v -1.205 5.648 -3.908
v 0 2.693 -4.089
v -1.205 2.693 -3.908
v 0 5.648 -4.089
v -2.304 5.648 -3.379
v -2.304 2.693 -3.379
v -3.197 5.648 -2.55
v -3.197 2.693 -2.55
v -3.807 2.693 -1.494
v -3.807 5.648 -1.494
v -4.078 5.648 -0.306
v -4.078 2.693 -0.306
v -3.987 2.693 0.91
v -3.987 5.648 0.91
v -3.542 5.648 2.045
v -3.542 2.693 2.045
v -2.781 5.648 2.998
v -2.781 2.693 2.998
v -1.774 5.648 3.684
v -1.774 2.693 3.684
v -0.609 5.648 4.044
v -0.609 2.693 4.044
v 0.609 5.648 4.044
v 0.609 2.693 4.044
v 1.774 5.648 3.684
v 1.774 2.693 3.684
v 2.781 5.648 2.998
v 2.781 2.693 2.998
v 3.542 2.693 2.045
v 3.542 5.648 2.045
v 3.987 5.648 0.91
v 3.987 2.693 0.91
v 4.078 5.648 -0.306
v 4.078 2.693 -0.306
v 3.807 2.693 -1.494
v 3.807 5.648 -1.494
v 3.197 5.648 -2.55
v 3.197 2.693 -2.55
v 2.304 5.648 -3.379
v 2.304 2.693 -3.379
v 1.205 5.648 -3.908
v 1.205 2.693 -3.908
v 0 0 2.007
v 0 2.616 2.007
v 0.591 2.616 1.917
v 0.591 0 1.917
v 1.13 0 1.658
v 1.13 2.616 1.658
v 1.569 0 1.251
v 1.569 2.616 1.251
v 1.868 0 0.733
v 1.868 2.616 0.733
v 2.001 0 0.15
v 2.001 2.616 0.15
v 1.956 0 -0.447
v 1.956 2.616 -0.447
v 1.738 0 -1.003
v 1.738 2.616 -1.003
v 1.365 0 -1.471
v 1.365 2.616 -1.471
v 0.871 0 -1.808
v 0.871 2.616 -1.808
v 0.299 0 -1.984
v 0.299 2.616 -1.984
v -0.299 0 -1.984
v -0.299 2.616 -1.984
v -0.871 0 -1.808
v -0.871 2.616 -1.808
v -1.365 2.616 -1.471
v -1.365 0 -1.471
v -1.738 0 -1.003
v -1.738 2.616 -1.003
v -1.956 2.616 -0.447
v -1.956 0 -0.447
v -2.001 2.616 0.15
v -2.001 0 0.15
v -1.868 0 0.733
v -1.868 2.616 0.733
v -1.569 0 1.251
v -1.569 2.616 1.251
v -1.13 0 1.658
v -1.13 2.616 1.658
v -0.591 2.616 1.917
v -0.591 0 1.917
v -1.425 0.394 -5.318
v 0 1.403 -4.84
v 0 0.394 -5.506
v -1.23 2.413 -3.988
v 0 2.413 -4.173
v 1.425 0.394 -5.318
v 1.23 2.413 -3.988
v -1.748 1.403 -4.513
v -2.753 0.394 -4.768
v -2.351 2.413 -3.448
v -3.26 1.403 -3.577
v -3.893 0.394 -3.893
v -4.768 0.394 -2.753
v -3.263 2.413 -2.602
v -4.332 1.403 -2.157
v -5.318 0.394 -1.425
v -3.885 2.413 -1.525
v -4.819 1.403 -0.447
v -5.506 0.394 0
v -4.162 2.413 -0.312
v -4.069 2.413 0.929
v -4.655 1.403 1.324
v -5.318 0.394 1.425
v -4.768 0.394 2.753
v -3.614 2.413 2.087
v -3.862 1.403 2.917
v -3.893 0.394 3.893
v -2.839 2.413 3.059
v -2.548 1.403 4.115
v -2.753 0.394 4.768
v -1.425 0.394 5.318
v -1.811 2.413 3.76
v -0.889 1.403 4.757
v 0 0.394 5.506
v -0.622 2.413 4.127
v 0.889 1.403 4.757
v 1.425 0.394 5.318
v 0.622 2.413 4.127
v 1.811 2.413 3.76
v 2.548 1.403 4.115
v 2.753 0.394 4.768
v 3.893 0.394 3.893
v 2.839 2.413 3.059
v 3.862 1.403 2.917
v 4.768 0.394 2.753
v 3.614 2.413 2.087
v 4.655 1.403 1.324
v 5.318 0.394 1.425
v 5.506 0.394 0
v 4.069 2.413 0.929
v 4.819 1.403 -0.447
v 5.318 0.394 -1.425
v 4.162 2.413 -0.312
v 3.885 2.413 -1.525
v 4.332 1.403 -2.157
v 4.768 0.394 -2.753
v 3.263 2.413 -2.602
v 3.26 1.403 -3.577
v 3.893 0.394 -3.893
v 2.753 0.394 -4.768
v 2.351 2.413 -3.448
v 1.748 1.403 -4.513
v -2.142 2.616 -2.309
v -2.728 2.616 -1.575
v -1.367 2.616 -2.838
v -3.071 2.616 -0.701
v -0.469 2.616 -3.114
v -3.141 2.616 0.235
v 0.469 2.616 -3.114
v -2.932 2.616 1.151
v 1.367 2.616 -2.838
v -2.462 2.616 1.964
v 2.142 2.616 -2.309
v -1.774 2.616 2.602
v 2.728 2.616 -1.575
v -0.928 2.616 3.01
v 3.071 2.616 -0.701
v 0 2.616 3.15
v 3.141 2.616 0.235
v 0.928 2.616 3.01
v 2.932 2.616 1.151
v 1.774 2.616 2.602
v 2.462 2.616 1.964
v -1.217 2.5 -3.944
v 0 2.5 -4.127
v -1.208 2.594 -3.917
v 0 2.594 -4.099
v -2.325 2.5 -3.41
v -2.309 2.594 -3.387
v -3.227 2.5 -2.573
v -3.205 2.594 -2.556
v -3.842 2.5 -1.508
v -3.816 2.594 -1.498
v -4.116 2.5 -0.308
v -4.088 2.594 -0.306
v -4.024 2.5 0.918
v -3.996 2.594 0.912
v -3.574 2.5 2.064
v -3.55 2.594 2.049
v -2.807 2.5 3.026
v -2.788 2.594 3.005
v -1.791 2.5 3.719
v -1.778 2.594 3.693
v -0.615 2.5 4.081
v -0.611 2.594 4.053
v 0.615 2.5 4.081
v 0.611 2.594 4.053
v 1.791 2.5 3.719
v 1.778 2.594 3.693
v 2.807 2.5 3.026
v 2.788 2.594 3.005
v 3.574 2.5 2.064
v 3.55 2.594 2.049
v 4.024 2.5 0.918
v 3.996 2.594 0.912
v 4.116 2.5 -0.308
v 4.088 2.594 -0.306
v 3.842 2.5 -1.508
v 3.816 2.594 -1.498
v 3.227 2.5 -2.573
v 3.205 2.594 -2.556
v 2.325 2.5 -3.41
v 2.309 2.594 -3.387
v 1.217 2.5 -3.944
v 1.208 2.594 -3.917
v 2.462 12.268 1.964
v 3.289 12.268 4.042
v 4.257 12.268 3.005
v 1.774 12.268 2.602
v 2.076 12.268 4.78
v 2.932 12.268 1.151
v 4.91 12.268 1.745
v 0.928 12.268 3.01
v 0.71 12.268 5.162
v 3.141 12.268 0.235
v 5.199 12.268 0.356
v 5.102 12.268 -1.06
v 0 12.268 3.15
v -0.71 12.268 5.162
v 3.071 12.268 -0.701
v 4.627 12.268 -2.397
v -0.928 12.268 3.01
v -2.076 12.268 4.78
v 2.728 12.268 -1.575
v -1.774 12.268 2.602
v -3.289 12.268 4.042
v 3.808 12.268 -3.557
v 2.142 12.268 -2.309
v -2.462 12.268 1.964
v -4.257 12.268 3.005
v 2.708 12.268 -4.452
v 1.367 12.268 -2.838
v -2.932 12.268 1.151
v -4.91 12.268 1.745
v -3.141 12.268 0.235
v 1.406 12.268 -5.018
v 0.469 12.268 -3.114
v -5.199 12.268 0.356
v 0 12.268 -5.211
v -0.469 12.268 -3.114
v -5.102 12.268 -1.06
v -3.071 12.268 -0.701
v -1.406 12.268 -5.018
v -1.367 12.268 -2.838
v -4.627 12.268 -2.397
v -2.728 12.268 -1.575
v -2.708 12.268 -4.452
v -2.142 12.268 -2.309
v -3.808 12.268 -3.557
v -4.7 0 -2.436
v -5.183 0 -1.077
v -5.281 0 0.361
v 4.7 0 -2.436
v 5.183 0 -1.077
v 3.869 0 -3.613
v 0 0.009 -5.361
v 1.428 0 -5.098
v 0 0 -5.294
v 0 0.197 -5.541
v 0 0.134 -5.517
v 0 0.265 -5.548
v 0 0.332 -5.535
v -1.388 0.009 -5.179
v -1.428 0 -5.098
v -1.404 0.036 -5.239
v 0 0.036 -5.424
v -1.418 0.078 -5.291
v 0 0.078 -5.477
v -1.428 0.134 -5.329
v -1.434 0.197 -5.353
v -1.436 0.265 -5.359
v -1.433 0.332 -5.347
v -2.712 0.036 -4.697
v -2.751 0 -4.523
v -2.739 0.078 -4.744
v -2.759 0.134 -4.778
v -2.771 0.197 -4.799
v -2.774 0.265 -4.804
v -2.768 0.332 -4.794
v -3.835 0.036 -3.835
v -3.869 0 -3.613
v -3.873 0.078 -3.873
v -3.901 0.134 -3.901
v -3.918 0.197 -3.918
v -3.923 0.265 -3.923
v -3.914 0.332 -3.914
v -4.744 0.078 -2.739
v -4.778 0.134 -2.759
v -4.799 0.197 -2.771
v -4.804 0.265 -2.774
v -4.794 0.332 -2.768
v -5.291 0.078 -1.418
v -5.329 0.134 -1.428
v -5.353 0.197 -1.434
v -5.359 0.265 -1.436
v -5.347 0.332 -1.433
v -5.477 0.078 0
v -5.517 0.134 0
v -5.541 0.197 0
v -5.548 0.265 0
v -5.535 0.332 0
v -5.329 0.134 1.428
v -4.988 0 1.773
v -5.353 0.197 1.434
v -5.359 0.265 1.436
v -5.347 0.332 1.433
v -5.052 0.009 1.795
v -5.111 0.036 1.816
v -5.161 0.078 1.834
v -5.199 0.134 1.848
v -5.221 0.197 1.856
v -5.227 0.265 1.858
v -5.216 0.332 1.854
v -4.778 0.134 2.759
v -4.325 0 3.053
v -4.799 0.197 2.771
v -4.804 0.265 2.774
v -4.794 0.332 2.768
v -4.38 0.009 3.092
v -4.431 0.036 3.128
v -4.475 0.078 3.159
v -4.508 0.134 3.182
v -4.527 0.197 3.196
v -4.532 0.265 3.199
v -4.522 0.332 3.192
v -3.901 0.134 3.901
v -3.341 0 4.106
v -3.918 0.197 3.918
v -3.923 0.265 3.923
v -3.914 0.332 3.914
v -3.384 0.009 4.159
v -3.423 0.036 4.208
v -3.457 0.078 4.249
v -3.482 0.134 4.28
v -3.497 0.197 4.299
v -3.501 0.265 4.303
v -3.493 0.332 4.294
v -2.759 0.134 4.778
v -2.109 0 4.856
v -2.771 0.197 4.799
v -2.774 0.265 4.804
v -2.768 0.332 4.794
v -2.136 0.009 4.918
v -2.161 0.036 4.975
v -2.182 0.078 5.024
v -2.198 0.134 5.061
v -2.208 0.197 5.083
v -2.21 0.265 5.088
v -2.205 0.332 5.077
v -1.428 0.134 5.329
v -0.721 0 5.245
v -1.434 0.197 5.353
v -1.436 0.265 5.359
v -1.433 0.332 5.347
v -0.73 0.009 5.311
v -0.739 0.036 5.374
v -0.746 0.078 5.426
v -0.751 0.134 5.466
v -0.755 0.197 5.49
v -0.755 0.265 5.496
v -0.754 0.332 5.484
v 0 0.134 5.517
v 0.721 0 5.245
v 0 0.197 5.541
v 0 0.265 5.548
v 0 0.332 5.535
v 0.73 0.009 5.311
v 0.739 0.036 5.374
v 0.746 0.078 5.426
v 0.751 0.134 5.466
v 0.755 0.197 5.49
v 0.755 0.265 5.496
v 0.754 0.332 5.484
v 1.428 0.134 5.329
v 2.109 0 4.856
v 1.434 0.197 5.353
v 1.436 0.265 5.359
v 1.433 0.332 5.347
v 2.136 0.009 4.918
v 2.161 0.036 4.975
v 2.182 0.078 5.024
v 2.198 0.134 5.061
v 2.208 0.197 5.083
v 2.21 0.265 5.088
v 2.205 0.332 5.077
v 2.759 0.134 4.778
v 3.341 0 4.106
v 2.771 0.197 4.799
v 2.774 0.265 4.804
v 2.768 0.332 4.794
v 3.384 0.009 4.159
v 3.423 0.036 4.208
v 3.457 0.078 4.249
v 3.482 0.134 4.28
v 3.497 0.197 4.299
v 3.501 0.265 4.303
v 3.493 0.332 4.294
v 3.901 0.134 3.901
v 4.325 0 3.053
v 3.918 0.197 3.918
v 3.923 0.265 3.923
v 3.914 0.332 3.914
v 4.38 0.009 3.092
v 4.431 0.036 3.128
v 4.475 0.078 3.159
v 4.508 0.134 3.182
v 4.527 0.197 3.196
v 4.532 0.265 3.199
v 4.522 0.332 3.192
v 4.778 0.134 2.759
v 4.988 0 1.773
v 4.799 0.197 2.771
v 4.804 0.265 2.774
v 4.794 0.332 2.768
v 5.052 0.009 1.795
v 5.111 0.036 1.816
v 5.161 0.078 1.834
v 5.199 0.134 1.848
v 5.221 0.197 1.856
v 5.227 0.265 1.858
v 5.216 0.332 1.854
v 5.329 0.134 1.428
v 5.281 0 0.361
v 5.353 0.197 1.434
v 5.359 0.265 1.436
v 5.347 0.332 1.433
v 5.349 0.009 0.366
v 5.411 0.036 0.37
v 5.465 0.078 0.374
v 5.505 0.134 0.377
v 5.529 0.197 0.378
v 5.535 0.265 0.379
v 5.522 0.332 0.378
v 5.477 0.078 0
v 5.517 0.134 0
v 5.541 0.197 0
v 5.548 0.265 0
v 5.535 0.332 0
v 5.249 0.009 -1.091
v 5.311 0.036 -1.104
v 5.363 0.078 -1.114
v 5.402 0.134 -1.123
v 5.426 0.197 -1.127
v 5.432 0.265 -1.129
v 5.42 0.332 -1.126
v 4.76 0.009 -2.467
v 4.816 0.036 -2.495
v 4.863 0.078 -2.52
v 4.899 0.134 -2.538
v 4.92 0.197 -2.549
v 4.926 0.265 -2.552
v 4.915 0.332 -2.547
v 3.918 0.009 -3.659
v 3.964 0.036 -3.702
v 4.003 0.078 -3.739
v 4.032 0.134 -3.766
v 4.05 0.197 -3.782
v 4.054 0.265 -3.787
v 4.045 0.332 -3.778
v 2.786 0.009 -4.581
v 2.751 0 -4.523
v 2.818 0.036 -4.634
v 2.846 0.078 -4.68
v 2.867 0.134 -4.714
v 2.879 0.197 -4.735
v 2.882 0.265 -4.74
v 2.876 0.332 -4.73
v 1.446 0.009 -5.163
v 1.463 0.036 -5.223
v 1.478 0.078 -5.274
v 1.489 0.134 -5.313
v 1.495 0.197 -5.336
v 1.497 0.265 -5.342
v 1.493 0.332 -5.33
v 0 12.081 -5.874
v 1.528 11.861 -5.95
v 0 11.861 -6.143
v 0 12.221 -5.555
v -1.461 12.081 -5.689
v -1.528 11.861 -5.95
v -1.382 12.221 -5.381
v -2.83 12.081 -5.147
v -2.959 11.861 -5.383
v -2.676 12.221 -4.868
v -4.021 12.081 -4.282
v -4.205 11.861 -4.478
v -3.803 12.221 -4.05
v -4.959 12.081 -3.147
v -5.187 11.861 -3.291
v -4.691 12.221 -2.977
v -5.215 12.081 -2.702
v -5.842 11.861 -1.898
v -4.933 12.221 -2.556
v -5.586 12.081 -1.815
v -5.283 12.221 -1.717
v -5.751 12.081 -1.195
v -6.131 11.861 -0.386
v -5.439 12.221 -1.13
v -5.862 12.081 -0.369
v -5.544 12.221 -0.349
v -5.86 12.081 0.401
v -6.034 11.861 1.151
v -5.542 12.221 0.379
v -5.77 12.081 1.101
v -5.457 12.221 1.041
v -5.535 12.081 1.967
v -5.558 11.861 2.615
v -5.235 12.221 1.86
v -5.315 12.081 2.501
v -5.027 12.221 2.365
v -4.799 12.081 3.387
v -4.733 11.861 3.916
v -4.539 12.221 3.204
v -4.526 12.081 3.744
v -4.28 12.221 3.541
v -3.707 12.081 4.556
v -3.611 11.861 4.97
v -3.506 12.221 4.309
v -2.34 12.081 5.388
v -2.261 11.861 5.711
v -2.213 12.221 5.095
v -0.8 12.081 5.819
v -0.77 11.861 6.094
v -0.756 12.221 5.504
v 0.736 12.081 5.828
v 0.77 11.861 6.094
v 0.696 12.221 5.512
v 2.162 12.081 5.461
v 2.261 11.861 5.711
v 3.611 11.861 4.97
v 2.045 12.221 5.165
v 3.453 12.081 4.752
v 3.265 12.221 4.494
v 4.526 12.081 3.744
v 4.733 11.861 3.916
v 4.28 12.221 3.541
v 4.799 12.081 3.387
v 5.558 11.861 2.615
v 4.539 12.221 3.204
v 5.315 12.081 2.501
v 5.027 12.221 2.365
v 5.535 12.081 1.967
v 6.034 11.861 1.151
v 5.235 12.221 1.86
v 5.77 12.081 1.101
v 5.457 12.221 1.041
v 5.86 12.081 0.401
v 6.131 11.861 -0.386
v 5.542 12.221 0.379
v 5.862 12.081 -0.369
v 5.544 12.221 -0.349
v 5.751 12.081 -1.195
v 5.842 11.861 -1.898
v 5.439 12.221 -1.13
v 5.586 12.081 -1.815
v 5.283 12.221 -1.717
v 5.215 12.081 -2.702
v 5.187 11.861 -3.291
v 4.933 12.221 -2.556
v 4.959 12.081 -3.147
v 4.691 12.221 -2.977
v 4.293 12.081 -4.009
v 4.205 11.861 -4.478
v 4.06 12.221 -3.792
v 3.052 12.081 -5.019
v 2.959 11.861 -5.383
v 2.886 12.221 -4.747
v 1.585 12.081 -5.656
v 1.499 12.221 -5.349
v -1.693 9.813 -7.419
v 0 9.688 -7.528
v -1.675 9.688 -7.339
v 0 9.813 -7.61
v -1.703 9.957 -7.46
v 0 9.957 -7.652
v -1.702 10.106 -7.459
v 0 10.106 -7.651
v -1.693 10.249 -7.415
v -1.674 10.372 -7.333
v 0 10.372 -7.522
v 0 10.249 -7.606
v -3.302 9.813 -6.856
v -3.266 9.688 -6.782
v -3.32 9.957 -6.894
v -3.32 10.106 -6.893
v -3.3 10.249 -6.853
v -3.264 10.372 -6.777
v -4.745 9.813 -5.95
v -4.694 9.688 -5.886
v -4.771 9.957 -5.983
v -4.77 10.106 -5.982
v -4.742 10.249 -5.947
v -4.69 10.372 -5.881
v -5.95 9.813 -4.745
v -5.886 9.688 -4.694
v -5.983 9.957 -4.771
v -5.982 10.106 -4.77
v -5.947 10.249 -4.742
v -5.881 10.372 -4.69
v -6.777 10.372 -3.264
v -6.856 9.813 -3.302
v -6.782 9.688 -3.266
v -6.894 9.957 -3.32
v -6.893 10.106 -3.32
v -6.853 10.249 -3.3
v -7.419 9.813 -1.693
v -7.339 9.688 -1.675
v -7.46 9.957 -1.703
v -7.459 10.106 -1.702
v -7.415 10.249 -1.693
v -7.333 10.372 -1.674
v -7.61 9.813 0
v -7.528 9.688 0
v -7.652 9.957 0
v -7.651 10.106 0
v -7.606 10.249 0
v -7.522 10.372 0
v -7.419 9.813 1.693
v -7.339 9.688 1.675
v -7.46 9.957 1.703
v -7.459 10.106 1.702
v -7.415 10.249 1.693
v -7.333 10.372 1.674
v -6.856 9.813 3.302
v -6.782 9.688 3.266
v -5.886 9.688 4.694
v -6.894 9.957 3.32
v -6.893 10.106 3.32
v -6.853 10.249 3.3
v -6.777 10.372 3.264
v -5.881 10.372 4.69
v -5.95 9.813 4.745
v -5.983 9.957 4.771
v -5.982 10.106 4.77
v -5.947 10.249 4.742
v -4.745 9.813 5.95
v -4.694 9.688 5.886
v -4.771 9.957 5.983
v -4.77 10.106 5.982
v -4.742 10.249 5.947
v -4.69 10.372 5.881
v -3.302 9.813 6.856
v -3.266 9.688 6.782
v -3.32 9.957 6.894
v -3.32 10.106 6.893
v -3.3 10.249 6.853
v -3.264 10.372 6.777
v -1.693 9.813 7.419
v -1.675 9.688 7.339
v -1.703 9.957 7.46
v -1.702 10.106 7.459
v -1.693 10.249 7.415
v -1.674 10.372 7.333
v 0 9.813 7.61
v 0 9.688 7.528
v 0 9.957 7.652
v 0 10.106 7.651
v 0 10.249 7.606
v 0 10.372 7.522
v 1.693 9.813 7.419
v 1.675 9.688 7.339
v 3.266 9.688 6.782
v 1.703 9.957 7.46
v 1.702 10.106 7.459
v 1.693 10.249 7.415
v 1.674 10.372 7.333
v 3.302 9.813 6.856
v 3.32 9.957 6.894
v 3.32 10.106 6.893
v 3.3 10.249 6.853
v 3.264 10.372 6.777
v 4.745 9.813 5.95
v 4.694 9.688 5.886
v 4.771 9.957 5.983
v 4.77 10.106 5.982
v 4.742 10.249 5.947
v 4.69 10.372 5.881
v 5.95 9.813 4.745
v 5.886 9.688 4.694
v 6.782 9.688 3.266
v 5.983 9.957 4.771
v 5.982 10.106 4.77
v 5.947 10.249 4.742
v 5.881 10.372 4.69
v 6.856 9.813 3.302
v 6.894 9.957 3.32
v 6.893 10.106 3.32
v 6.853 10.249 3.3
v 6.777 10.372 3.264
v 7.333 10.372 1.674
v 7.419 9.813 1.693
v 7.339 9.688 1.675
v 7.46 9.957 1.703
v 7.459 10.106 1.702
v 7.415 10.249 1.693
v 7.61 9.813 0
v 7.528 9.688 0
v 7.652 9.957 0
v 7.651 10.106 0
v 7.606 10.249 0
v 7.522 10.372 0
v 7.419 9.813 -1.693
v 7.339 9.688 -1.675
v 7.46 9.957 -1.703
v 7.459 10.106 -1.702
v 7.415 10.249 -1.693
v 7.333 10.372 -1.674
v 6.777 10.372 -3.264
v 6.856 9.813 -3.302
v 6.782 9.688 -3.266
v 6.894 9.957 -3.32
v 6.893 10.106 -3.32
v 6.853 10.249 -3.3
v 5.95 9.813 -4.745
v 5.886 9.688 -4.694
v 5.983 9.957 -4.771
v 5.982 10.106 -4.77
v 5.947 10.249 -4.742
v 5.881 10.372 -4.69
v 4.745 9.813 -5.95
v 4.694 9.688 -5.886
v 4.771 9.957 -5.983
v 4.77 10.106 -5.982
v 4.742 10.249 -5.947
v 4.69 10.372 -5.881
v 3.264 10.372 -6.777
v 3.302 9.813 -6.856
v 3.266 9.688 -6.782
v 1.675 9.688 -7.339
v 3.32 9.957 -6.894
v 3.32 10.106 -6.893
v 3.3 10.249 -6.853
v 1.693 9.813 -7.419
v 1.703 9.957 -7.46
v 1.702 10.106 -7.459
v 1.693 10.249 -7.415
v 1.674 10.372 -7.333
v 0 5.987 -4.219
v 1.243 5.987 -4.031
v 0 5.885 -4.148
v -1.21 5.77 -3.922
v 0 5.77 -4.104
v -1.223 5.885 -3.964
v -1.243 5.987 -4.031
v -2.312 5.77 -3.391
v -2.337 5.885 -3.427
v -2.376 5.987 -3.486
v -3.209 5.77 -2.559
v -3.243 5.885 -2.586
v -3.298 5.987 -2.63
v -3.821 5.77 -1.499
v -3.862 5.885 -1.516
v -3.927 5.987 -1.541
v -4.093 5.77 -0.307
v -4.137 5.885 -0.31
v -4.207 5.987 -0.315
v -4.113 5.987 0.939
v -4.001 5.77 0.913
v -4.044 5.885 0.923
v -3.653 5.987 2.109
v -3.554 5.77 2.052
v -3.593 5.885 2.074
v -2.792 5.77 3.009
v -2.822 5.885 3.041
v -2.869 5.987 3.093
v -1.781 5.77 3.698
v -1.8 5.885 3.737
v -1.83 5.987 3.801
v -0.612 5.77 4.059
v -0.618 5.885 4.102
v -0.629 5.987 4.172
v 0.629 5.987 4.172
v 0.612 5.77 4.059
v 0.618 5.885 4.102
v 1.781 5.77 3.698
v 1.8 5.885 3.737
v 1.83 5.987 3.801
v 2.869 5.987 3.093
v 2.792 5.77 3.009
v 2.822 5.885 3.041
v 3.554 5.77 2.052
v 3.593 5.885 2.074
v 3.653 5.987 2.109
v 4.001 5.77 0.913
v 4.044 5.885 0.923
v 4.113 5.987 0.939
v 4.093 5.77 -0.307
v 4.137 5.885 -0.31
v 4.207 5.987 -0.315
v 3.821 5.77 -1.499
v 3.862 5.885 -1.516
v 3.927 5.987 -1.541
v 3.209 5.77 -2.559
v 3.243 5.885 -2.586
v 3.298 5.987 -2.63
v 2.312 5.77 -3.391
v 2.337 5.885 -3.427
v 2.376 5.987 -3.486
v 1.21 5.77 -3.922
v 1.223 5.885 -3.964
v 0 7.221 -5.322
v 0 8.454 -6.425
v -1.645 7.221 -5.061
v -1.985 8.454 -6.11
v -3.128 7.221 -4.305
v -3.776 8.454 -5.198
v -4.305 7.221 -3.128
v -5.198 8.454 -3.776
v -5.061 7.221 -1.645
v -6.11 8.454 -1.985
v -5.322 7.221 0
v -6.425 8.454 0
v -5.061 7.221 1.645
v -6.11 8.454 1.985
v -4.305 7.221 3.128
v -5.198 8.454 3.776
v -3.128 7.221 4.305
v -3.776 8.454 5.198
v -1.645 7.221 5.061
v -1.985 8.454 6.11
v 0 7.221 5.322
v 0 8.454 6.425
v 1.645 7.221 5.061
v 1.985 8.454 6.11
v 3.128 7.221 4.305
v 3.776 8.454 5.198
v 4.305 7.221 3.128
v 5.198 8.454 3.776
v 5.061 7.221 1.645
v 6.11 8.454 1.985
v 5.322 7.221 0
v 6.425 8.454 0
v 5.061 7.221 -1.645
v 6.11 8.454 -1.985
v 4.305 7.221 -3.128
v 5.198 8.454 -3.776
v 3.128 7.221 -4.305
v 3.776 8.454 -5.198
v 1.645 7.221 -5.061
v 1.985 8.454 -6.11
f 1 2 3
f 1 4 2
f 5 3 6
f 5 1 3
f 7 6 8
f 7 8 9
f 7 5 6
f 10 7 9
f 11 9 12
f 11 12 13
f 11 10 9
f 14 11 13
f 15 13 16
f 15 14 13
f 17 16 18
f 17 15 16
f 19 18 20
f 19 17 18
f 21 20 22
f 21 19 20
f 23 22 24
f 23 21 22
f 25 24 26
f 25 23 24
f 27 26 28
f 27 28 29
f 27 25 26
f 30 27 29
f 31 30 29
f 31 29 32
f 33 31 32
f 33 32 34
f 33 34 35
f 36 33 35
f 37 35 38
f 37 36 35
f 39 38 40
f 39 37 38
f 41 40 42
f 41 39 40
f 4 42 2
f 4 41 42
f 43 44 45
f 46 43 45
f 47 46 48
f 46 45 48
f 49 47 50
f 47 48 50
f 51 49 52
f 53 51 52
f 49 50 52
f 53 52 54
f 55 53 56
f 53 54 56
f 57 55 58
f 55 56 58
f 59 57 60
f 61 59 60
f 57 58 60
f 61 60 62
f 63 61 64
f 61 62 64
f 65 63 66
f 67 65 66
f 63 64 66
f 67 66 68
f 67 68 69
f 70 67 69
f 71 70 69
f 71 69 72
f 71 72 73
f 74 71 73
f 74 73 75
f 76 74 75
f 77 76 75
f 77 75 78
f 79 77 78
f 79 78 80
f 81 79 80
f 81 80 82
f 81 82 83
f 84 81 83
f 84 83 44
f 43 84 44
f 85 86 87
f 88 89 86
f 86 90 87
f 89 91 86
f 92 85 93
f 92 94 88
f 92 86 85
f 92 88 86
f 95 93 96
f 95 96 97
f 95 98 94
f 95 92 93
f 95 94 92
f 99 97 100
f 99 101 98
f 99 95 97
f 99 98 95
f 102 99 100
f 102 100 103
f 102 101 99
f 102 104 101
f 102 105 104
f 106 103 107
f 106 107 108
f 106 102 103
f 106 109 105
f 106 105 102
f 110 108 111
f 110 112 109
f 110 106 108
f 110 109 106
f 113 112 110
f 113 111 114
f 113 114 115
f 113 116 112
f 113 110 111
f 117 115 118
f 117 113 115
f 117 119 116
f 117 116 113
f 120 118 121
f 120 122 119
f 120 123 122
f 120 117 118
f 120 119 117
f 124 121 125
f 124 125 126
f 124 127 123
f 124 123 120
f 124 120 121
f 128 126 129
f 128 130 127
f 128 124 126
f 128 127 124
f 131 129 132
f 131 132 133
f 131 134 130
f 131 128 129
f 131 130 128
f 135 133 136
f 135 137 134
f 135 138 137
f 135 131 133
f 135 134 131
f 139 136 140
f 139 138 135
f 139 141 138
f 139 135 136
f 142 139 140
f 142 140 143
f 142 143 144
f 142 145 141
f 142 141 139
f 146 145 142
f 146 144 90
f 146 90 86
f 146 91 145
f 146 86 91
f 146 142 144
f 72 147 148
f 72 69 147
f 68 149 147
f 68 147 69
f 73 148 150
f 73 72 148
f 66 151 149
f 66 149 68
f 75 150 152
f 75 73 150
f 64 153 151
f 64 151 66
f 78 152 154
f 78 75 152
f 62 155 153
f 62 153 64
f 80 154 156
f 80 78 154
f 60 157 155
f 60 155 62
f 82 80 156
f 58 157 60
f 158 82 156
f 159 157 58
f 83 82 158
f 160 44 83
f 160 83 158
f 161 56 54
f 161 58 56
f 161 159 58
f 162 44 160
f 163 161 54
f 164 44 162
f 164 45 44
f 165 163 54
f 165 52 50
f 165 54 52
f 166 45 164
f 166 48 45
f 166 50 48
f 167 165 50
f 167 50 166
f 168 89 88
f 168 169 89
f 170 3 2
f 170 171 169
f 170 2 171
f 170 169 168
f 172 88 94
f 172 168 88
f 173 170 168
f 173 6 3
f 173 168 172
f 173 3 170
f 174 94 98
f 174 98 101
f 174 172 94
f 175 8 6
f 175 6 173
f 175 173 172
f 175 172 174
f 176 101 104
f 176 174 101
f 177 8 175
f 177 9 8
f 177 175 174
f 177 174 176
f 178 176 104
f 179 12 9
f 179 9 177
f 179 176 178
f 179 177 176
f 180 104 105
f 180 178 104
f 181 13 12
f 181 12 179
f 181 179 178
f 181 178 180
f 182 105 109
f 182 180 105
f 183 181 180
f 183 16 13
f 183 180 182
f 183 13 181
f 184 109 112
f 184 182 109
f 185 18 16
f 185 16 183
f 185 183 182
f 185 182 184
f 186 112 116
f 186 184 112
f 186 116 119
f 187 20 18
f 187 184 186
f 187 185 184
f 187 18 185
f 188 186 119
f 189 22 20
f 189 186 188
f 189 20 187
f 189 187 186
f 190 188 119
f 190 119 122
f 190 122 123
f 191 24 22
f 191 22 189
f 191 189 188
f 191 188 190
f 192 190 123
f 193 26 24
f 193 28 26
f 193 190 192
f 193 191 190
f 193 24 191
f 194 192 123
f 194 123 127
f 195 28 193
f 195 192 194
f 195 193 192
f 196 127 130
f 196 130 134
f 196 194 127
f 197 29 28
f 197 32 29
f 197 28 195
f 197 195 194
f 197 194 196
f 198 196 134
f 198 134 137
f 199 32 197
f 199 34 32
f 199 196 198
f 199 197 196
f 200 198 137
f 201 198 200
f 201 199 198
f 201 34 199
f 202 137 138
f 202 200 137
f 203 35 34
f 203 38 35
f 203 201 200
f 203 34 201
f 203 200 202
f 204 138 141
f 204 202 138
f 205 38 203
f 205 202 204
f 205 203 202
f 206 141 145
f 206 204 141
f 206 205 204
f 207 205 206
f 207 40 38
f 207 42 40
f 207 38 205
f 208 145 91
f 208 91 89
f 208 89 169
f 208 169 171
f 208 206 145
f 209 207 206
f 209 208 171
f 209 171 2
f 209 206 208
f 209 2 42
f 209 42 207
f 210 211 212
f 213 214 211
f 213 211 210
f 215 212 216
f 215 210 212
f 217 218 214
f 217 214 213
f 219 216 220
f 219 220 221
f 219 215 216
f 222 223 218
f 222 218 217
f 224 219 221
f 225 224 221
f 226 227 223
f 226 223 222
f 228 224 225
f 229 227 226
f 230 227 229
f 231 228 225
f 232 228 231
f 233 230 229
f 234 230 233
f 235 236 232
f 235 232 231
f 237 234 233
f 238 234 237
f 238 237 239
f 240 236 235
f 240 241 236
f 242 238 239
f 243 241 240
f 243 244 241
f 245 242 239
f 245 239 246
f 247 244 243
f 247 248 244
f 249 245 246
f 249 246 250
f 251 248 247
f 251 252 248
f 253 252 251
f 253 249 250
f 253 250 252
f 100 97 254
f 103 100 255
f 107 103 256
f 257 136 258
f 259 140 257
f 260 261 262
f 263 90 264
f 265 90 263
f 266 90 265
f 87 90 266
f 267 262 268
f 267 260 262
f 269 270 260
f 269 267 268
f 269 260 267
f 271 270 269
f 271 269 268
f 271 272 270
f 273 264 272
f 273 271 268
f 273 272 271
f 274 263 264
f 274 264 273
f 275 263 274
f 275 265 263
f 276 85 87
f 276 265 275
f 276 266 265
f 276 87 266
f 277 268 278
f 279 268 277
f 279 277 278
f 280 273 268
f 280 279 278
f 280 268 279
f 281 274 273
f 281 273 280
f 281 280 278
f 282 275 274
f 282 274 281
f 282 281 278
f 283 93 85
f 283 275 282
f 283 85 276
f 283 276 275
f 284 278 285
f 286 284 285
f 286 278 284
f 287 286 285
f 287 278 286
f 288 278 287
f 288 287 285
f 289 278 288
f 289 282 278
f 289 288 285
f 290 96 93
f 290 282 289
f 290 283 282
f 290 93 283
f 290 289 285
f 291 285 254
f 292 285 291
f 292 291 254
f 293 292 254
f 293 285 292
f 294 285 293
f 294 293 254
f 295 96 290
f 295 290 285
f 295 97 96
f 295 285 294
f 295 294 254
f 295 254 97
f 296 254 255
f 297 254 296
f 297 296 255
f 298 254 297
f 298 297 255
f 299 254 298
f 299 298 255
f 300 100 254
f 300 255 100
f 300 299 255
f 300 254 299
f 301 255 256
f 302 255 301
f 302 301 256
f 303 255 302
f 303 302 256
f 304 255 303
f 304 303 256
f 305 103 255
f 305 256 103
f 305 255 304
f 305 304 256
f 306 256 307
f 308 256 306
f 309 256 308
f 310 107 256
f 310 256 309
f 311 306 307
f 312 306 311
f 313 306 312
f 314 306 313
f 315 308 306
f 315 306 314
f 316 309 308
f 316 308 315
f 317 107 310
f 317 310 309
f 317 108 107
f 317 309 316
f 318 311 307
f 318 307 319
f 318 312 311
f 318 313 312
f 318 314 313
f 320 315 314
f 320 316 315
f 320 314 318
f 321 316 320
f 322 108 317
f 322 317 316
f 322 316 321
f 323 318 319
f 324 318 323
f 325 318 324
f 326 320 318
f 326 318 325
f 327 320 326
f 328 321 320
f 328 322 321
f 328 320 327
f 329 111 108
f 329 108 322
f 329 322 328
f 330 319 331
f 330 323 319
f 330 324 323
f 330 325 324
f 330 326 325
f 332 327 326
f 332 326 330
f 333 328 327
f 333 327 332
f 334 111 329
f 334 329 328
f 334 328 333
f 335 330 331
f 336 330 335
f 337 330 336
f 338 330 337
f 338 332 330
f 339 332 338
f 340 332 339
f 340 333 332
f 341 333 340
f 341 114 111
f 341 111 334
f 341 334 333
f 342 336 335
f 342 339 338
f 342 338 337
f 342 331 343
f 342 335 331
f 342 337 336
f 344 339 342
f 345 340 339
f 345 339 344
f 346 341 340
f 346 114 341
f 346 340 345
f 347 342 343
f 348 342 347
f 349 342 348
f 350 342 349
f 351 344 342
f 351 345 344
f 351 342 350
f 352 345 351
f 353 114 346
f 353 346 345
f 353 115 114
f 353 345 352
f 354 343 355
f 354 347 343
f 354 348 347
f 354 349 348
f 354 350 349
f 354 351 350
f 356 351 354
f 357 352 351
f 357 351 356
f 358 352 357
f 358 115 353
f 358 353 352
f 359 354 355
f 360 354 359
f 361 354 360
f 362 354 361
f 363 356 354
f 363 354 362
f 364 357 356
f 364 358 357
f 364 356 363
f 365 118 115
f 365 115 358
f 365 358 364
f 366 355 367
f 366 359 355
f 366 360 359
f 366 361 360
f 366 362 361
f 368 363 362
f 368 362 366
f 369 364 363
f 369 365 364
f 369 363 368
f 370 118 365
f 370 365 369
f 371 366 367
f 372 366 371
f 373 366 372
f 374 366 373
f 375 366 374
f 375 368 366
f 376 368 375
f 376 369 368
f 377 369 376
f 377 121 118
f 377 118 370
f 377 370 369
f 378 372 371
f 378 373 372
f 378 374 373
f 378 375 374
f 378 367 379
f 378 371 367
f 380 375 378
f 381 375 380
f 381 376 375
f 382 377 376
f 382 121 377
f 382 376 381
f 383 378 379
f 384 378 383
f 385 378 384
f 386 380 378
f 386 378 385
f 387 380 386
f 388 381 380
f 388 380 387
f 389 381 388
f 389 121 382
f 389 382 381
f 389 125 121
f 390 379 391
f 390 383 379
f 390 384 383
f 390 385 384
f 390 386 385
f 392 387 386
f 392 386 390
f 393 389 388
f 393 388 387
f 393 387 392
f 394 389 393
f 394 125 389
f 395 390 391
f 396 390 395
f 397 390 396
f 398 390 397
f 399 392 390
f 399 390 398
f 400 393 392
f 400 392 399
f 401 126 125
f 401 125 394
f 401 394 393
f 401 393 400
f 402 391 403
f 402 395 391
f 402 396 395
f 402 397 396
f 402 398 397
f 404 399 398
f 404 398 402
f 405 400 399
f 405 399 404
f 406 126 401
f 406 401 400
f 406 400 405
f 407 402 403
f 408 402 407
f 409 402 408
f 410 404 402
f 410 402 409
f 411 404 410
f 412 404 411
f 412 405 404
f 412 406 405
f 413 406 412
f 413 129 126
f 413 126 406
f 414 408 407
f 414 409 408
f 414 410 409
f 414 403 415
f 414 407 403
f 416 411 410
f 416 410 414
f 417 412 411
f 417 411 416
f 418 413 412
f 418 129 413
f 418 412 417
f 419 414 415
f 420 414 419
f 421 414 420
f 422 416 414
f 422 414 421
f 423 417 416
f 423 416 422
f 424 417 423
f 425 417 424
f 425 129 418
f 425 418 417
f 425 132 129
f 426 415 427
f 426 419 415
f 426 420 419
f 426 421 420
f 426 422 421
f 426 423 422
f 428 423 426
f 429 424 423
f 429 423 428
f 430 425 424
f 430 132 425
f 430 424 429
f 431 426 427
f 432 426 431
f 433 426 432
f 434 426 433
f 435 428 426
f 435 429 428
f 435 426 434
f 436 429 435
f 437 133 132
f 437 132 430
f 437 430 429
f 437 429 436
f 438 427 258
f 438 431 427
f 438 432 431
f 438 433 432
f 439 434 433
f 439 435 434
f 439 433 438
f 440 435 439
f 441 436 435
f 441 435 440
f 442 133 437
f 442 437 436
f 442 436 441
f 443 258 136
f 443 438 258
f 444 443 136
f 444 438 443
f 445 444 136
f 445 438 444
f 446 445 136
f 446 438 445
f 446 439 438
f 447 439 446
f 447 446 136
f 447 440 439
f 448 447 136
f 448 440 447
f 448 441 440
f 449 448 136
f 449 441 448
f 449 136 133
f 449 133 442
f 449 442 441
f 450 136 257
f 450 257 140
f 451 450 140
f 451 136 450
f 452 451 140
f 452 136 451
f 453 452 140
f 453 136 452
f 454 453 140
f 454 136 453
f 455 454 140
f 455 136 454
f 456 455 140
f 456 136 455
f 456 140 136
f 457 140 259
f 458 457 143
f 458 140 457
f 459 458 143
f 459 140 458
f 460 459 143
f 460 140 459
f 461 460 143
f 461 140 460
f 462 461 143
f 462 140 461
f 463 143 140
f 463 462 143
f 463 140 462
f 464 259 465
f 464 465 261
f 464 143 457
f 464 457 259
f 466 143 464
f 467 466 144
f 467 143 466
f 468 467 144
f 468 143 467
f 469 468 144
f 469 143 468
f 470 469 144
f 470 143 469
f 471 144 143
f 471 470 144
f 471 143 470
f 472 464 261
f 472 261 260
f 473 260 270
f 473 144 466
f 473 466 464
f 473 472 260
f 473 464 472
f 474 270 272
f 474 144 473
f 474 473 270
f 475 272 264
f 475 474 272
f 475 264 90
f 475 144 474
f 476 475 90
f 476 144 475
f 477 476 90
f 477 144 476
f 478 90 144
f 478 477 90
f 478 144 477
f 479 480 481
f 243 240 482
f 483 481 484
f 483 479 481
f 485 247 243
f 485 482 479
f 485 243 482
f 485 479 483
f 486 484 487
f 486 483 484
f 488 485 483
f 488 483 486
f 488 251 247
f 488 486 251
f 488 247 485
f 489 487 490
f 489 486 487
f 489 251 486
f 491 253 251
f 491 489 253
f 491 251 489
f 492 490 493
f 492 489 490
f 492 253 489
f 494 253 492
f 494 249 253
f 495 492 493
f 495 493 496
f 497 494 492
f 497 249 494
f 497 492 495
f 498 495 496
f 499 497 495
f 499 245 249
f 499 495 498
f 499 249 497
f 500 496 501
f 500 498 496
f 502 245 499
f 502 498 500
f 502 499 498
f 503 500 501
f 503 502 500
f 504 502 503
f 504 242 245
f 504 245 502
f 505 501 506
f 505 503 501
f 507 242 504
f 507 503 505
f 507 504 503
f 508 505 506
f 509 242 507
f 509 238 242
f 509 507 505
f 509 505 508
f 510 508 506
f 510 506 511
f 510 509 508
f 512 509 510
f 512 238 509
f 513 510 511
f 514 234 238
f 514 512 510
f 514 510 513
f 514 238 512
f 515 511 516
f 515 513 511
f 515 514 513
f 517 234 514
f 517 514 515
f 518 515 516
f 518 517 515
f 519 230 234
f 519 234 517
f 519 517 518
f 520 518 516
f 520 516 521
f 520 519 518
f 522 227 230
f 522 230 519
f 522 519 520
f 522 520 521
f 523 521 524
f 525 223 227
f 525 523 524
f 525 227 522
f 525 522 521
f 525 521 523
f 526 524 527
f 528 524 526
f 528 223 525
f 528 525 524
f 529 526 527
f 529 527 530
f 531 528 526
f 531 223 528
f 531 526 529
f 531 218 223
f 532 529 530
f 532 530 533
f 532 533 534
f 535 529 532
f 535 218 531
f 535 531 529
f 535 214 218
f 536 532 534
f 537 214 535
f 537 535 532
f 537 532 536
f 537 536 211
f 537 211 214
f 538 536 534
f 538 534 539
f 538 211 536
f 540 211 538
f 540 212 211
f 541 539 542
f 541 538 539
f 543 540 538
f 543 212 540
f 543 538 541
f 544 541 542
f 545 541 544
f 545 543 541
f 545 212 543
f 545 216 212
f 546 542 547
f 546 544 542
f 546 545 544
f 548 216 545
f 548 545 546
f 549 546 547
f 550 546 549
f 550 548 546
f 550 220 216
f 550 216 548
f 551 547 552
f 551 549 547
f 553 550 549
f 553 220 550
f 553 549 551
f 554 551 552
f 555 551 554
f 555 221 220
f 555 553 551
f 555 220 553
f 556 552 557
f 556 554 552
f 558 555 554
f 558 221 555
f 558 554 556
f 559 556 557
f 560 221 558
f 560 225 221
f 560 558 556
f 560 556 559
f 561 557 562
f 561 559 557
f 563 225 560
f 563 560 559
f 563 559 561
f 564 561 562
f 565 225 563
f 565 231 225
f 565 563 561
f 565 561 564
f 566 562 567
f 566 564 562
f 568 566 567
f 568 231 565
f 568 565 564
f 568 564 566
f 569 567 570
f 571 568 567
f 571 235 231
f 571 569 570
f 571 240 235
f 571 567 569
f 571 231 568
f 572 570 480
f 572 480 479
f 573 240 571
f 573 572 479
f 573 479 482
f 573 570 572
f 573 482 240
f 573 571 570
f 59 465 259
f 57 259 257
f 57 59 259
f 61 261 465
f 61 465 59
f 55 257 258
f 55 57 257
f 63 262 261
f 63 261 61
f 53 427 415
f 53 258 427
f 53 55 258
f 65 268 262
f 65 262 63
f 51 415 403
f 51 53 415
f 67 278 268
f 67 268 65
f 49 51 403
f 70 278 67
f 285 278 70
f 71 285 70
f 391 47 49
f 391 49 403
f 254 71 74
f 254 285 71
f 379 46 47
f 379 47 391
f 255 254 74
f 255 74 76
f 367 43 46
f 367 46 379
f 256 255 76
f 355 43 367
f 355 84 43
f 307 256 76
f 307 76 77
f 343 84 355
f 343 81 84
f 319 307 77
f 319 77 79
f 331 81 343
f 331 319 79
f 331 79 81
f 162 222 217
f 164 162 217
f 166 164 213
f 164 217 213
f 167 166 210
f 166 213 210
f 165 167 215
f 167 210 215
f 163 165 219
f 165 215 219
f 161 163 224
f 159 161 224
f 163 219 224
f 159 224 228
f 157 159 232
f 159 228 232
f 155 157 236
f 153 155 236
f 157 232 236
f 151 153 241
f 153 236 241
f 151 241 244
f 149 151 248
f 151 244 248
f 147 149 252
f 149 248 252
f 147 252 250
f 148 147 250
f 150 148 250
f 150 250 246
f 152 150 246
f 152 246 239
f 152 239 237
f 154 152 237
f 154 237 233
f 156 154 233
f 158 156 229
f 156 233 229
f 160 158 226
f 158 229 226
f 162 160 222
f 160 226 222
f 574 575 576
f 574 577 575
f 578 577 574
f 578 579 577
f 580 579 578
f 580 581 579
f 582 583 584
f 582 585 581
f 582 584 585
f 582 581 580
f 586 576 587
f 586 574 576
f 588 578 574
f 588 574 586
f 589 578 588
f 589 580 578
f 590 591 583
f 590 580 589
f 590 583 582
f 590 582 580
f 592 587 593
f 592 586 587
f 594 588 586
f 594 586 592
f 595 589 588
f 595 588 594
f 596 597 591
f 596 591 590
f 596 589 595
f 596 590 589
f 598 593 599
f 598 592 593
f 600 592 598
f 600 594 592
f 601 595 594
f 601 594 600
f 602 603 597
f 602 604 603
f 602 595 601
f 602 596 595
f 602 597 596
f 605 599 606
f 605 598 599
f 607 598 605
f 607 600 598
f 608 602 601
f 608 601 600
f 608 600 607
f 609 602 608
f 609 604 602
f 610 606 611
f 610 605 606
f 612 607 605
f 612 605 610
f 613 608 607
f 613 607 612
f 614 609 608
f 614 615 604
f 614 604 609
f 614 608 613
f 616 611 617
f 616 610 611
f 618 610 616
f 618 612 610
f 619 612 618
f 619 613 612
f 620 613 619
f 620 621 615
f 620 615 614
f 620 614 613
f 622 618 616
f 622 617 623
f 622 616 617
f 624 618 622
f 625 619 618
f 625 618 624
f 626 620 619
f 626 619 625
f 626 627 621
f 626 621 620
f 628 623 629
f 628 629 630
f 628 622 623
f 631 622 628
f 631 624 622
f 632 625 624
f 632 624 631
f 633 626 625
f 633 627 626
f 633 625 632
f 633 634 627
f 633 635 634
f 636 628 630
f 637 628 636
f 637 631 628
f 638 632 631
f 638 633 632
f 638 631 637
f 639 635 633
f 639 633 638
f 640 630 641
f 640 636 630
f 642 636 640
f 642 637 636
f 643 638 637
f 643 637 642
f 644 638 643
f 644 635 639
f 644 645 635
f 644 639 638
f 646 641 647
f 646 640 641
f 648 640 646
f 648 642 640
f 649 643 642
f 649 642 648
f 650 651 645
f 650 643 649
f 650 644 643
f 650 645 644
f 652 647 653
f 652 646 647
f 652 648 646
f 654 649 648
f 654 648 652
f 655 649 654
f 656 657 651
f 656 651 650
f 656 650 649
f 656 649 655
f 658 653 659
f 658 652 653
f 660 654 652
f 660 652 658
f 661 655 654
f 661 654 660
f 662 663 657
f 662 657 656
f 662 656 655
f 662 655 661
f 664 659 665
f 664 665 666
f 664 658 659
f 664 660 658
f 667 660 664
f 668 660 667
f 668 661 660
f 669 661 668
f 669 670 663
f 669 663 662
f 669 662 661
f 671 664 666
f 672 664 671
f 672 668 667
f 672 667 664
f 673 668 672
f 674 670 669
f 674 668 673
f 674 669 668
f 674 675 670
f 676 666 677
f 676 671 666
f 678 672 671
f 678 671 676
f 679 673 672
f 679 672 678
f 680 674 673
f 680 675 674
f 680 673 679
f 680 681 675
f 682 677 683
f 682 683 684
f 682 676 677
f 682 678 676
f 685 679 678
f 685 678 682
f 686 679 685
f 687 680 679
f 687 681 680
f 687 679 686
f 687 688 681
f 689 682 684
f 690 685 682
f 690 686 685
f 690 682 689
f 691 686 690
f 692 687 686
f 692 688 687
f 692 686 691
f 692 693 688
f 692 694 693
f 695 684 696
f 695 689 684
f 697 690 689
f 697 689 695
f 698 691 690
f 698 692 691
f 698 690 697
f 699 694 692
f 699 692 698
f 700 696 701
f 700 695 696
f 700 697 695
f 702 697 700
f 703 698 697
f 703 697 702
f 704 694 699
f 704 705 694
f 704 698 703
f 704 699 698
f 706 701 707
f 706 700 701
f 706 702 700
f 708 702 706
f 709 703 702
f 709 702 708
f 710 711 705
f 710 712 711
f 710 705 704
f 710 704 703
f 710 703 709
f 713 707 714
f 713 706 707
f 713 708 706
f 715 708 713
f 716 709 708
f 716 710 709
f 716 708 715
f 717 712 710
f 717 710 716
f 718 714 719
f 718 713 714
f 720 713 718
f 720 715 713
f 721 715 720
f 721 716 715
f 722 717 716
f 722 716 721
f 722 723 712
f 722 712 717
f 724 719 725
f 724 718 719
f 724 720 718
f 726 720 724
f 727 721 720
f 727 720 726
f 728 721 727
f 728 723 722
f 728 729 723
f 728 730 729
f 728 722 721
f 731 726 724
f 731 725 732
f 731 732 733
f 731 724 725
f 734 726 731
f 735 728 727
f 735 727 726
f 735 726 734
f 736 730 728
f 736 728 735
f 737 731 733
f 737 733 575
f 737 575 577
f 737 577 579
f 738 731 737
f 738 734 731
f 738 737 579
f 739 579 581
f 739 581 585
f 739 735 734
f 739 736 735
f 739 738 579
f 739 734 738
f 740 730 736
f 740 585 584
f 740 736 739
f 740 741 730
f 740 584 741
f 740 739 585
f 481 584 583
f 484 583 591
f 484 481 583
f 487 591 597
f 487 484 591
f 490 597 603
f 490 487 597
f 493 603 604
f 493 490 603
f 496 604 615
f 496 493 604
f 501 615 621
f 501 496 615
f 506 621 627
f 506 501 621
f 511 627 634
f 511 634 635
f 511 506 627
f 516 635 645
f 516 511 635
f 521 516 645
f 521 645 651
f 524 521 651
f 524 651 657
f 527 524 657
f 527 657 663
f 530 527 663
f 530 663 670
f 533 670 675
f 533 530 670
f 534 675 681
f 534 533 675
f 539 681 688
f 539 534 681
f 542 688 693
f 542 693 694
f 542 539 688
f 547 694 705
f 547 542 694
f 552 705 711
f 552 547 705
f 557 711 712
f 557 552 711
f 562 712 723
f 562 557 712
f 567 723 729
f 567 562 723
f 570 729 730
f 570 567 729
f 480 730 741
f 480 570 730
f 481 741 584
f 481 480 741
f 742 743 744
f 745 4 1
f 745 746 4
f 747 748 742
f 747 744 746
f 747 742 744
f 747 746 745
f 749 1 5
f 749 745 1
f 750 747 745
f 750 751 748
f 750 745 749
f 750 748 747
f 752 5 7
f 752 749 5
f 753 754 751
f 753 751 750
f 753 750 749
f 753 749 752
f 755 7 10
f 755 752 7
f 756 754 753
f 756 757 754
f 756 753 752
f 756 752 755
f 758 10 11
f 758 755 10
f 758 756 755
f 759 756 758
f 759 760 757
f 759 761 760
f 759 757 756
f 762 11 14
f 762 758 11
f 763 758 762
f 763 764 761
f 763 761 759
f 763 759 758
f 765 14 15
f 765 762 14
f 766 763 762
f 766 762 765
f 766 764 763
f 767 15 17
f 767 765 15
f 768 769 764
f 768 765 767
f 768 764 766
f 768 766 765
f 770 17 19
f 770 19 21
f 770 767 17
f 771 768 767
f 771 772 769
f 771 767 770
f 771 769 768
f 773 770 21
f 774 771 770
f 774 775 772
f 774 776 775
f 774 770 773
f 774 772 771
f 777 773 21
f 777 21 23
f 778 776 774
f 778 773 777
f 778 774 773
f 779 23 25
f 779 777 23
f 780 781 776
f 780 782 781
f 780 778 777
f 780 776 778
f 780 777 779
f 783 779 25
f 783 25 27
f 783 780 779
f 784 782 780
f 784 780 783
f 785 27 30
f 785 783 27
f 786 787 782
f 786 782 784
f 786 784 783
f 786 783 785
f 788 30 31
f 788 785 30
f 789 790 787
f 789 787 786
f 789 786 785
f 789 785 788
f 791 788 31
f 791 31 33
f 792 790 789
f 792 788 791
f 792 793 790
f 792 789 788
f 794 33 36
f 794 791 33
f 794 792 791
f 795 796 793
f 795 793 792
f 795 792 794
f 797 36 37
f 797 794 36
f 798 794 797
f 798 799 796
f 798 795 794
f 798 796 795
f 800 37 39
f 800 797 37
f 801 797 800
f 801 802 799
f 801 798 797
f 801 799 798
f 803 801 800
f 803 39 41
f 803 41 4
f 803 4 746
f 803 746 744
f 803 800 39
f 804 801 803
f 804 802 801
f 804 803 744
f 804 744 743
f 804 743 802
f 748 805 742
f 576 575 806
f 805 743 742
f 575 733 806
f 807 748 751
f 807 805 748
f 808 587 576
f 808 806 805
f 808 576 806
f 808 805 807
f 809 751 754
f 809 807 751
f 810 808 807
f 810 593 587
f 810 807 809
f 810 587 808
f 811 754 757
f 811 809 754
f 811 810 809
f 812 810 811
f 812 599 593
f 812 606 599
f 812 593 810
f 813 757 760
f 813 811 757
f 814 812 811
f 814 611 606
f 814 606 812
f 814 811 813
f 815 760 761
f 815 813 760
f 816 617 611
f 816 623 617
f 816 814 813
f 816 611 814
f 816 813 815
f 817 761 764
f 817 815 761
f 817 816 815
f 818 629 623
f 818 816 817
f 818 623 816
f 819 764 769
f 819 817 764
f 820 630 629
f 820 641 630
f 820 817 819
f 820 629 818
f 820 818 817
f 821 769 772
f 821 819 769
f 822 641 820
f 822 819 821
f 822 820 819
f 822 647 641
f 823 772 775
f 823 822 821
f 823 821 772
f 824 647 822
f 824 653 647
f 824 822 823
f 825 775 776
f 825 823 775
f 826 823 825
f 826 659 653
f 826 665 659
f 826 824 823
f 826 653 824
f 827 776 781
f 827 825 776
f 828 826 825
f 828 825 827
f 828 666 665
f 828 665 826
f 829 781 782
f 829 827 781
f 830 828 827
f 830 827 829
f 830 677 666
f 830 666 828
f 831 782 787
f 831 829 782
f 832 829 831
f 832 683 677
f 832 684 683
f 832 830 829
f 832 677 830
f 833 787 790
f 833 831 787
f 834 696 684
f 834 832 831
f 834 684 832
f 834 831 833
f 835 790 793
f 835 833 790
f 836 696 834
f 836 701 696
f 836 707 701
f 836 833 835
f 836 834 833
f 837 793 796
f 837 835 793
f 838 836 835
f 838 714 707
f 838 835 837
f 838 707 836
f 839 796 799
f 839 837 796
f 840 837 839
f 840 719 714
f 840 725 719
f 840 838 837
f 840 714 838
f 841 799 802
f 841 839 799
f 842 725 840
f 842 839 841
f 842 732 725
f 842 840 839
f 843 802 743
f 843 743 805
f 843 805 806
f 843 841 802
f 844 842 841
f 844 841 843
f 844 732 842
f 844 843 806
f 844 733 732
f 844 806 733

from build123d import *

# Parameters (mm, degrees)
SKETCH2_R          = 3.1496
SKETCH2_R_2        = 2.0066
CUT_EXTRUDE1_DEPTH = 9.652
SKETCH2_2_R        = 2.0066
CUT_EXTRUDE2_DEPTH = 17.363717474


with BuildPart() as part:
    # Sketch1 → Revolve1 (revolve)
    with BuildSketch(Plane.XY):
        with BuildLine():
            Line((0, 0), (5.293826023, 0))
            ThreePointArc((5.293826023, 0), (5.517493338, 0.13363002), (5.505816812, 0.393913921))
            Line((5.505816812, 0.393913921), (4.173418421, 2.412699361))
            ThreePointArc((4.173418421, 2.412699361), (4.110857791, 2.54644271), (4.0894, 2.692527203))
            Line((4.0894, 2.692527203), (4.0894, 5.648040158))
            ThreePointArc((4.0894, 5.648040158), (4.122815879, 5.82924146), (4.218667369, 5.986604176))
            Line((4.218667369, 5.986604176), (7.527837593, 9.688387816))
            ThreePointArc((7.527837593, 9.688387816), (7.657085265, 10.031425293), (7.521816282, 10.37213334))
            Line((7.521816282, 10.37213334), (6.142780319, 11.861153766))
            ThreePointArc((6.142780319, 11.861153766), (5.719405756, 12.161997938), (5.21100202, 12.2682))
            Line((5.21100202, 12.2682), (0, 12.2682))
            Line((0, 12.2682), (0, 0))
        make_face()
    revolve(axis=Axis((0, 0, 0), (0, 1, 0)))

    # Sketch2 → Cut-Extrude1 (cut)
    with BuildSketch(Plane(origin=(0, 12.2682, 0), x_dir=(1, 0, 0), z_dir=(0, 1, 0))):
        Circle(SKETCH2_R)
        Circle(SKETCH2_R_2, mode=Mode.SUBTRACT)
    extrude(amount=-CUT_EXTRUDE1_DEPTH, mode=Mode.SUBTRACT)

    # Sketch2<2> → Cut-Extrude2 (cut, through all)
    with BuildSketch(Plane(origin=(0, 12.2682, 0), x_dir=(1, 0, 0), z_dir=(0, 1, 0))):
        Circle(SKETCH2_2_R)
    extrude(amount=-CUT_EXTRUDE2_DEPTH, mode=Mode.SUBTRACT)


solid = part.part
